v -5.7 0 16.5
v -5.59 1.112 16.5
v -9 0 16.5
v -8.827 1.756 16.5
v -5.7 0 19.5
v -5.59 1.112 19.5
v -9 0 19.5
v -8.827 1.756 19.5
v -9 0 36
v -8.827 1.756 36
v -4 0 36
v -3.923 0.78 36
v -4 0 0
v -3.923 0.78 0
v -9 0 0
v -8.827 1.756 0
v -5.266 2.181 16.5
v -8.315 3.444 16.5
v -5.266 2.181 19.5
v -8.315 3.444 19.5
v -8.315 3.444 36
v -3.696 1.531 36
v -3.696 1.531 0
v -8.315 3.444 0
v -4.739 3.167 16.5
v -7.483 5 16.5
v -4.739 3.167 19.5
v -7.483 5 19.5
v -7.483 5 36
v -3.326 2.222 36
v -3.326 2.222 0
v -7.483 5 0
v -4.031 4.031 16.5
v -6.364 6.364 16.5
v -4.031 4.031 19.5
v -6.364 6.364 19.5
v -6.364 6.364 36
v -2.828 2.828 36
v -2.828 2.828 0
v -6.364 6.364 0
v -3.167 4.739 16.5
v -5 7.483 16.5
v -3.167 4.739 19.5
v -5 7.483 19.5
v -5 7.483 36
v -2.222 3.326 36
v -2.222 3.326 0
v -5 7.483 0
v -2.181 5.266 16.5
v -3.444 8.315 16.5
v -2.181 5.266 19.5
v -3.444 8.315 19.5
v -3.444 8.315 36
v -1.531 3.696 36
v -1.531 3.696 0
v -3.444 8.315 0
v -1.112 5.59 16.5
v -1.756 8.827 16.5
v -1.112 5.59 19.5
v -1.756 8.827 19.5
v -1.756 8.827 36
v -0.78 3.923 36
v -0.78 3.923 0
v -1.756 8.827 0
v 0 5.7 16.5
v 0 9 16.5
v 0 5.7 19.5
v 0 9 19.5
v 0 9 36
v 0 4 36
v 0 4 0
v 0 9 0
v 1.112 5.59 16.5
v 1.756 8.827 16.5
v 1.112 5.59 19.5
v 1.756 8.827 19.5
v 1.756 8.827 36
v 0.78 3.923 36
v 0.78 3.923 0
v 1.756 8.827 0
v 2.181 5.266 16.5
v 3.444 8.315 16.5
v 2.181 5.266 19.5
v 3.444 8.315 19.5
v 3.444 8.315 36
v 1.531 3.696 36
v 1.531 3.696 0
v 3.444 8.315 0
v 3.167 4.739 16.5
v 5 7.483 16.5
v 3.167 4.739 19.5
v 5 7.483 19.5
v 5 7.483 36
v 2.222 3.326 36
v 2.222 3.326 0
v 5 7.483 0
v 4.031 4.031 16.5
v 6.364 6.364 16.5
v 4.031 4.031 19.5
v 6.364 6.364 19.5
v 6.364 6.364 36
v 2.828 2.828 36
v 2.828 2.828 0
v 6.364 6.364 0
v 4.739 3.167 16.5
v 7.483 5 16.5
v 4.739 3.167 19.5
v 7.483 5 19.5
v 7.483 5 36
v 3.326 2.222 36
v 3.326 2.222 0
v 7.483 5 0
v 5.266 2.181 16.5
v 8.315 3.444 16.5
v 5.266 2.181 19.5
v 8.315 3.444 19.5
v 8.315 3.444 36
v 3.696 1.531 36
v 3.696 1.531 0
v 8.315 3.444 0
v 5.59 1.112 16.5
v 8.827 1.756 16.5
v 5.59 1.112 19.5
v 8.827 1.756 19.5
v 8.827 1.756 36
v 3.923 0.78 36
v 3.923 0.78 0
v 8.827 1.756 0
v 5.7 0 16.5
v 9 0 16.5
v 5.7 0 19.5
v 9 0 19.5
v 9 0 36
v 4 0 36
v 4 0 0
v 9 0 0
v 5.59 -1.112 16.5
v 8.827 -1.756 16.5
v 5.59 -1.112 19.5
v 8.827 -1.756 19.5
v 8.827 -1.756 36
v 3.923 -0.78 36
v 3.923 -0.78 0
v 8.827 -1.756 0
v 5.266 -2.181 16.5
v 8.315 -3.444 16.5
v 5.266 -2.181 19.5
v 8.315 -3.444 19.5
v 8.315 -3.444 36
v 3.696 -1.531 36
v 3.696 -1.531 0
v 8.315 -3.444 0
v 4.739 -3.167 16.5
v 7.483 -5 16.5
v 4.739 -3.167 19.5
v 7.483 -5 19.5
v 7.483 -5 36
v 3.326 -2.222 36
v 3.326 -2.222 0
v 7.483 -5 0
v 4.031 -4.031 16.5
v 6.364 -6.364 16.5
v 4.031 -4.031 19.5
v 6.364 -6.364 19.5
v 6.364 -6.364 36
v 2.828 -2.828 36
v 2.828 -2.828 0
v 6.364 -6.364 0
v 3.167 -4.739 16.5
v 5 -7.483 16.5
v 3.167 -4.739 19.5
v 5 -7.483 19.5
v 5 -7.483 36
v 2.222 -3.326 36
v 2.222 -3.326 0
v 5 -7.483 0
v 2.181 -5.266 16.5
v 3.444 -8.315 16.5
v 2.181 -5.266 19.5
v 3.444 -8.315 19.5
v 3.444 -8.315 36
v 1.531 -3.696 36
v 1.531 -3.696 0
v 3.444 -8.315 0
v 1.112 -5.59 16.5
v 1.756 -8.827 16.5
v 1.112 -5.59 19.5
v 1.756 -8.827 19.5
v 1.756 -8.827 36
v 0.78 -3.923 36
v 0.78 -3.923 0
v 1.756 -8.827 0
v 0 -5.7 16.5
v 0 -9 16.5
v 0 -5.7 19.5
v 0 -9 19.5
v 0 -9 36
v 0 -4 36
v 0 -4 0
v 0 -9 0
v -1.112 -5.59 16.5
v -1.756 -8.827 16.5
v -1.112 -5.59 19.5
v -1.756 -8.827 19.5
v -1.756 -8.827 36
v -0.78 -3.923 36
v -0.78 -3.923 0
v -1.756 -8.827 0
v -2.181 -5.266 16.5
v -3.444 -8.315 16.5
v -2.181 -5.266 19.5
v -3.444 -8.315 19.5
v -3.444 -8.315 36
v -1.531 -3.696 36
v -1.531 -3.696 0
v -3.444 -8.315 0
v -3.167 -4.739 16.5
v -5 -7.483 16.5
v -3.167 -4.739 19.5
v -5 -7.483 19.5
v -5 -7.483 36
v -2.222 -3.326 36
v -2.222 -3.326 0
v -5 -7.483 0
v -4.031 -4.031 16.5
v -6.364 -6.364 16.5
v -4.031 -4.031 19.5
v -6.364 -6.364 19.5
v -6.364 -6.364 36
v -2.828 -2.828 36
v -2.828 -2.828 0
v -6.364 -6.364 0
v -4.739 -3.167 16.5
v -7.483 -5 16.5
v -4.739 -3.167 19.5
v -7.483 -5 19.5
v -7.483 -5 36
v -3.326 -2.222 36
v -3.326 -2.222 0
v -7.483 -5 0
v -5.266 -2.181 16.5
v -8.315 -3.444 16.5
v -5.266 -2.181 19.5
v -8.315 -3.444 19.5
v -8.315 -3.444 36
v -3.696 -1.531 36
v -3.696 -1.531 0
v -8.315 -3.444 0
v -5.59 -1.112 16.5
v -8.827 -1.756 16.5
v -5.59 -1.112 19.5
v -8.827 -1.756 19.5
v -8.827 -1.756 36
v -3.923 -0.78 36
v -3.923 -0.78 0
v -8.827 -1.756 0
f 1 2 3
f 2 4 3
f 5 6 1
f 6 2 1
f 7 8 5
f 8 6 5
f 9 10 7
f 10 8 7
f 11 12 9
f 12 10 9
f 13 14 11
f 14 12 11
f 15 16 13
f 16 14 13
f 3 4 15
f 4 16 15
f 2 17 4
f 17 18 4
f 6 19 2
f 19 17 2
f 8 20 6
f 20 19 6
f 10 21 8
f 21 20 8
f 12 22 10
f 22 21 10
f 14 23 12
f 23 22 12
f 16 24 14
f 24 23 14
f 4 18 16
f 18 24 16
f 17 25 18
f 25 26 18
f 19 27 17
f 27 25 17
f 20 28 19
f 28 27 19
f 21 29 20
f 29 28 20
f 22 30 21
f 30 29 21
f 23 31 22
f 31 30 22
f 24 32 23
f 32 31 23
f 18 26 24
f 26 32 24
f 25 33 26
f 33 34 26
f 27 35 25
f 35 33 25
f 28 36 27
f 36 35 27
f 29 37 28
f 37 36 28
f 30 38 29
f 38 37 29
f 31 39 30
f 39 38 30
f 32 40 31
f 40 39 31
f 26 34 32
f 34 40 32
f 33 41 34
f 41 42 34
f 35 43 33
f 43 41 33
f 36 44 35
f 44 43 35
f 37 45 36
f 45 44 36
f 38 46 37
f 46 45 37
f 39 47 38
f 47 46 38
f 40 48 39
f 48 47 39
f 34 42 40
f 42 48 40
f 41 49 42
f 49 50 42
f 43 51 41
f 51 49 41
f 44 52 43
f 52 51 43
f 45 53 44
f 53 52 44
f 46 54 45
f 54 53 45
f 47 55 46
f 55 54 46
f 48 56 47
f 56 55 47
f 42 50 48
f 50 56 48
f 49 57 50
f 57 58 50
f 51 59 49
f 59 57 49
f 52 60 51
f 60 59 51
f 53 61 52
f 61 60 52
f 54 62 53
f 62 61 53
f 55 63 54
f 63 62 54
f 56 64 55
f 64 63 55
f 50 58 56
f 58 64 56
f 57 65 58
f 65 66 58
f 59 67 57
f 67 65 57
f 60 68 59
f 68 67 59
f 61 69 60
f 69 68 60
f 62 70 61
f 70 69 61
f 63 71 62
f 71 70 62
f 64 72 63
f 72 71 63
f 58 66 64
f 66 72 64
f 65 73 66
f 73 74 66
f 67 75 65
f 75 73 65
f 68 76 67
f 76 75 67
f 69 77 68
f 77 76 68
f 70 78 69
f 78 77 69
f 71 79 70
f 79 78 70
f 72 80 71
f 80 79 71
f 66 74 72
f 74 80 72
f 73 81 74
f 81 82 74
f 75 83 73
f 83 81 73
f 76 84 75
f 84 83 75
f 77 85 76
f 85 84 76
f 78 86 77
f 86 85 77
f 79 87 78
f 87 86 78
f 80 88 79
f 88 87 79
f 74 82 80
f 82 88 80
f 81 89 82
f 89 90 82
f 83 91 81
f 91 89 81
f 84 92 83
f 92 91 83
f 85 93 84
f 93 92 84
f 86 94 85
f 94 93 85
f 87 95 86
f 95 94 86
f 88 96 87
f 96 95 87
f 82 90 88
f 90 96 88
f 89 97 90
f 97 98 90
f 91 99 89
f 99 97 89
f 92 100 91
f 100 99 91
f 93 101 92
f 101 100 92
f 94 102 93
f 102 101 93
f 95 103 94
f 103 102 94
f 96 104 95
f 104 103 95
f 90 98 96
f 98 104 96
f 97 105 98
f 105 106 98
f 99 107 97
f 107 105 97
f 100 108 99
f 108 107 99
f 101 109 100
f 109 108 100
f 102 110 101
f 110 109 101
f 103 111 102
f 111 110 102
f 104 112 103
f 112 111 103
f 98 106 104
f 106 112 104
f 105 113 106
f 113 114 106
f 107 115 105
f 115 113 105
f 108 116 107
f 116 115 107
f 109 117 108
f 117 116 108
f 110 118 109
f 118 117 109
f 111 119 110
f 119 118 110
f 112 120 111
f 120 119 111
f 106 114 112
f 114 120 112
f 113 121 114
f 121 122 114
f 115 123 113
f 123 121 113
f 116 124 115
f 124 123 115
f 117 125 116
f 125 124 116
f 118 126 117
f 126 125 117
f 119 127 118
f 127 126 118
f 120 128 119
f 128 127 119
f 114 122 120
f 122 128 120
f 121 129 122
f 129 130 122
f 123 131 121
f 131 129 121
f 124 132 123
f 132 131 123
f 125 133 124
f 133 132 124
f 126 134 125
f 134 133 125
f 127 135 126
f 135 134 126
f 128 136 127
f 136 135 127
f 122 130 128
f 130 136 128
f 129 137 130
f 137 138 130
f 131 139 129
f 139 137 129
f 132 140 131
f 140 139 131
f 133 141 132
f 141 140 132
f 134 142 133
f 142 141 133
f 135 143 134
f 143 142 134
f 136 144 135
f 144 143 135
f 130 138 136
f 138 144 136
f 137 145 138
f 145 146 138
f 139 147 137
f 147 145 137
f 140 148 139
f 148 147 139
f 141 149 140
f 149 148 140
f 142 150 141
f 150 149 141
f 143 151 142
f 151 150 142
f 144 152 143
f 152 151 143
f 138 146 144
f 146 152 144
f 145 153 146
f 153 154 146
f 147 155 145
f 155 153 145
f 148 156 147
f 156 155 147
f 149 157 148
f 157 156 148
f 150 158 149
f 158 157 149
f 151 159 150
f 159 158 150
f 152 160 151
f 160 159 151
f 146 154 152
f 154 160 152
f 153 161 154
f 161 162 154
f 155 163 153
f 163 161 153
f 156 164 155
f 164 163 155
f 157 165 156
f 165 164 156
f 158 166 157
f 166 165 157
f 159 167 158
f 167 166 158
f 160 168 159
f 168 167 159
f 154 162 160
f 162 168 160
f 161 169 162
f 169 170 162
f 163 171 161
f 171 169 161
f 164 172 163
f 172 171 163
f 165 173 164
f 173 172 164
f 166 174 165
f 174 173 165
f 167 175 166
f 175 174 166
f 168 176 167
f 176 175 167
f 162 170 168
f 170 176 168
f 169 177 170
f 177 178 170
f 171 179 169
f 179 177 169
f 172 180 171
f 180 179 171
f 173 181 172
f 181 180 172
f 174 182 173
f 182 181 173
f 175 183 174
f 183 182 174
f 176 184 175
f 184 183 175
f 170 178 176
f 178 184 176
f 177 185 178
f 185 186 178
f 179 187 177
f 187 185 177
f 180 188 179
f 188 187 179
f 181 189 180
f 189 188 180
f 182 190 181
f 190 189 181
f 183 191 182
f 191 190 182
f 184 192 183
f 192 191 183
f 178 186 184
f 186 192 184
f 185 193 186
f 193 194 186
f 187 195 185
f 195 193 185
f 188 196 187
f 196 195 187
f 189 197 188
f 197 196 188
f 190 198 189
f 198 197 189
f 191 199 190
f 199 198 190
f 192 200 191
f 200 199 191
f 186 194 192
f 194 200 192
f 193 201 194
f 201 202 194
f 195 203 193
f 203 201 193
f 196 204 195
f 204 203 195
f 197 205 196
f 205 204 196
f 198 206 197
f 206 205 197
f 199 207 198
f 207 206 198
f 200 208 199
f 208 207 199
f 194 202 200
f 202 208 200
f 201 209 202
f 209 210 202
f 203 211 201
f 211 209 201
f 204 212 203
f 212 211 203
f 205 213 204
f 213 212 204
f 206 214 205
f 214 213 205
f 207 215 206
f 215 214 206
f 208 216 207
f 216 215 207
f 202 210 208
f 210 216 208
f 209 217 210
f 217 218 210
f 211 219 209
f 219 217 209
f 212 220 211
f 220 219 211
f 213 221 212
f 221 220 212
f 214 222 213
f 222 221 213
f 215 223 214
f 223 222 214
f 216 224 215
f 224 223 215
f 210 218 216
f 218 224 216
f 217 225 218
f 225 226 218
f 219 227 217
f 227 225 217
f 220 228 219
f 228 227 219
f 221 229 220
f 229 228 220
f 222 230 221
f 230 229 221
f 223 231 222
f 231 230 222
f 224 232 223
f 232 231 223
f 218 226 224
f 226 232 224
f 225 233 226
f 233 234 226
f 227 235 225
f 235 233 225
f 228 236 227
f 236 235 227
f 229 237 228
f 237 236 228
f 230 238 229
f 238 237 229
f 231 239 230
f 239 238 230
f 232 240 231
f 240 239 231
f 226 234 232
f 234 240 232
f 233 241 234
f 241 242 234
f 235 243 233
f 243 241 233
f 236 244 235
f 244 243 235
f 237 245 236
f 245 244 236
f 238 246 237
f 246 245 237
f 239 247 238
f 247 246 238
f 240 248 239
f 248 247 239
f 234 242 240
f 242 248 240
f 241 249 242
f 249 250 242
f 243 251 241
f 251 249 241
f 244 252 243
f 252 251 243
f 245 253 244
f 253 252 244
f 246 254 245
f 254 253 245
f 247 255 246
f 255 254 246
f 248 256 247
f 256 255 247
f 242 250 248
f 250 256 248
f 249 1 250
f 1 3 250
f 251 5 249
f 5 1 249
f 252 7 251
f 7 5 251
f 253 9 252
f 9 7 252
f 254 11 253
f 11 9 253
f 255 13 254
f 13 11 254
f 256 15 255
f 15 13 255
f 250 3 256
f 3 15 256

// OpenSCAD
$fn = 32;

// ----------------------------------------------------------------------
// Grooved revolve: plain_grooves, bore R4
// ----------------------------------------------------------------------

// --- parameters (mm) ---
bore_r = 4;               // bore radius
outer_r = 9;              // outer radius of the body
total_h = 36;             // overall height, Z
wall = 5;                 // radial wall thickness
groove_w = 3;             // groove width
groove_d = 3.3;           // groove depth
grooves = 1;              // number of outer grooves

bbox_x = 2 * outer_r;  // full diameter
bore_d = 2 * bore_r;  // bore diameter
body_d = 2 * outer_r;  // body diameter
revolve_angle = 360;  // full turn around the Z axis

profile = [[4, 0], [9, 0], [9, 16.5], [5.7, 16.5], [5.7, 19.5], [9, 19.5], [9, 36], [4, 36]];  // primary outline, 8 points, counter clockwise

// --- the one profile operation ---
rotate_extrude(angle = revolve_angle) polygon(points = profile);
